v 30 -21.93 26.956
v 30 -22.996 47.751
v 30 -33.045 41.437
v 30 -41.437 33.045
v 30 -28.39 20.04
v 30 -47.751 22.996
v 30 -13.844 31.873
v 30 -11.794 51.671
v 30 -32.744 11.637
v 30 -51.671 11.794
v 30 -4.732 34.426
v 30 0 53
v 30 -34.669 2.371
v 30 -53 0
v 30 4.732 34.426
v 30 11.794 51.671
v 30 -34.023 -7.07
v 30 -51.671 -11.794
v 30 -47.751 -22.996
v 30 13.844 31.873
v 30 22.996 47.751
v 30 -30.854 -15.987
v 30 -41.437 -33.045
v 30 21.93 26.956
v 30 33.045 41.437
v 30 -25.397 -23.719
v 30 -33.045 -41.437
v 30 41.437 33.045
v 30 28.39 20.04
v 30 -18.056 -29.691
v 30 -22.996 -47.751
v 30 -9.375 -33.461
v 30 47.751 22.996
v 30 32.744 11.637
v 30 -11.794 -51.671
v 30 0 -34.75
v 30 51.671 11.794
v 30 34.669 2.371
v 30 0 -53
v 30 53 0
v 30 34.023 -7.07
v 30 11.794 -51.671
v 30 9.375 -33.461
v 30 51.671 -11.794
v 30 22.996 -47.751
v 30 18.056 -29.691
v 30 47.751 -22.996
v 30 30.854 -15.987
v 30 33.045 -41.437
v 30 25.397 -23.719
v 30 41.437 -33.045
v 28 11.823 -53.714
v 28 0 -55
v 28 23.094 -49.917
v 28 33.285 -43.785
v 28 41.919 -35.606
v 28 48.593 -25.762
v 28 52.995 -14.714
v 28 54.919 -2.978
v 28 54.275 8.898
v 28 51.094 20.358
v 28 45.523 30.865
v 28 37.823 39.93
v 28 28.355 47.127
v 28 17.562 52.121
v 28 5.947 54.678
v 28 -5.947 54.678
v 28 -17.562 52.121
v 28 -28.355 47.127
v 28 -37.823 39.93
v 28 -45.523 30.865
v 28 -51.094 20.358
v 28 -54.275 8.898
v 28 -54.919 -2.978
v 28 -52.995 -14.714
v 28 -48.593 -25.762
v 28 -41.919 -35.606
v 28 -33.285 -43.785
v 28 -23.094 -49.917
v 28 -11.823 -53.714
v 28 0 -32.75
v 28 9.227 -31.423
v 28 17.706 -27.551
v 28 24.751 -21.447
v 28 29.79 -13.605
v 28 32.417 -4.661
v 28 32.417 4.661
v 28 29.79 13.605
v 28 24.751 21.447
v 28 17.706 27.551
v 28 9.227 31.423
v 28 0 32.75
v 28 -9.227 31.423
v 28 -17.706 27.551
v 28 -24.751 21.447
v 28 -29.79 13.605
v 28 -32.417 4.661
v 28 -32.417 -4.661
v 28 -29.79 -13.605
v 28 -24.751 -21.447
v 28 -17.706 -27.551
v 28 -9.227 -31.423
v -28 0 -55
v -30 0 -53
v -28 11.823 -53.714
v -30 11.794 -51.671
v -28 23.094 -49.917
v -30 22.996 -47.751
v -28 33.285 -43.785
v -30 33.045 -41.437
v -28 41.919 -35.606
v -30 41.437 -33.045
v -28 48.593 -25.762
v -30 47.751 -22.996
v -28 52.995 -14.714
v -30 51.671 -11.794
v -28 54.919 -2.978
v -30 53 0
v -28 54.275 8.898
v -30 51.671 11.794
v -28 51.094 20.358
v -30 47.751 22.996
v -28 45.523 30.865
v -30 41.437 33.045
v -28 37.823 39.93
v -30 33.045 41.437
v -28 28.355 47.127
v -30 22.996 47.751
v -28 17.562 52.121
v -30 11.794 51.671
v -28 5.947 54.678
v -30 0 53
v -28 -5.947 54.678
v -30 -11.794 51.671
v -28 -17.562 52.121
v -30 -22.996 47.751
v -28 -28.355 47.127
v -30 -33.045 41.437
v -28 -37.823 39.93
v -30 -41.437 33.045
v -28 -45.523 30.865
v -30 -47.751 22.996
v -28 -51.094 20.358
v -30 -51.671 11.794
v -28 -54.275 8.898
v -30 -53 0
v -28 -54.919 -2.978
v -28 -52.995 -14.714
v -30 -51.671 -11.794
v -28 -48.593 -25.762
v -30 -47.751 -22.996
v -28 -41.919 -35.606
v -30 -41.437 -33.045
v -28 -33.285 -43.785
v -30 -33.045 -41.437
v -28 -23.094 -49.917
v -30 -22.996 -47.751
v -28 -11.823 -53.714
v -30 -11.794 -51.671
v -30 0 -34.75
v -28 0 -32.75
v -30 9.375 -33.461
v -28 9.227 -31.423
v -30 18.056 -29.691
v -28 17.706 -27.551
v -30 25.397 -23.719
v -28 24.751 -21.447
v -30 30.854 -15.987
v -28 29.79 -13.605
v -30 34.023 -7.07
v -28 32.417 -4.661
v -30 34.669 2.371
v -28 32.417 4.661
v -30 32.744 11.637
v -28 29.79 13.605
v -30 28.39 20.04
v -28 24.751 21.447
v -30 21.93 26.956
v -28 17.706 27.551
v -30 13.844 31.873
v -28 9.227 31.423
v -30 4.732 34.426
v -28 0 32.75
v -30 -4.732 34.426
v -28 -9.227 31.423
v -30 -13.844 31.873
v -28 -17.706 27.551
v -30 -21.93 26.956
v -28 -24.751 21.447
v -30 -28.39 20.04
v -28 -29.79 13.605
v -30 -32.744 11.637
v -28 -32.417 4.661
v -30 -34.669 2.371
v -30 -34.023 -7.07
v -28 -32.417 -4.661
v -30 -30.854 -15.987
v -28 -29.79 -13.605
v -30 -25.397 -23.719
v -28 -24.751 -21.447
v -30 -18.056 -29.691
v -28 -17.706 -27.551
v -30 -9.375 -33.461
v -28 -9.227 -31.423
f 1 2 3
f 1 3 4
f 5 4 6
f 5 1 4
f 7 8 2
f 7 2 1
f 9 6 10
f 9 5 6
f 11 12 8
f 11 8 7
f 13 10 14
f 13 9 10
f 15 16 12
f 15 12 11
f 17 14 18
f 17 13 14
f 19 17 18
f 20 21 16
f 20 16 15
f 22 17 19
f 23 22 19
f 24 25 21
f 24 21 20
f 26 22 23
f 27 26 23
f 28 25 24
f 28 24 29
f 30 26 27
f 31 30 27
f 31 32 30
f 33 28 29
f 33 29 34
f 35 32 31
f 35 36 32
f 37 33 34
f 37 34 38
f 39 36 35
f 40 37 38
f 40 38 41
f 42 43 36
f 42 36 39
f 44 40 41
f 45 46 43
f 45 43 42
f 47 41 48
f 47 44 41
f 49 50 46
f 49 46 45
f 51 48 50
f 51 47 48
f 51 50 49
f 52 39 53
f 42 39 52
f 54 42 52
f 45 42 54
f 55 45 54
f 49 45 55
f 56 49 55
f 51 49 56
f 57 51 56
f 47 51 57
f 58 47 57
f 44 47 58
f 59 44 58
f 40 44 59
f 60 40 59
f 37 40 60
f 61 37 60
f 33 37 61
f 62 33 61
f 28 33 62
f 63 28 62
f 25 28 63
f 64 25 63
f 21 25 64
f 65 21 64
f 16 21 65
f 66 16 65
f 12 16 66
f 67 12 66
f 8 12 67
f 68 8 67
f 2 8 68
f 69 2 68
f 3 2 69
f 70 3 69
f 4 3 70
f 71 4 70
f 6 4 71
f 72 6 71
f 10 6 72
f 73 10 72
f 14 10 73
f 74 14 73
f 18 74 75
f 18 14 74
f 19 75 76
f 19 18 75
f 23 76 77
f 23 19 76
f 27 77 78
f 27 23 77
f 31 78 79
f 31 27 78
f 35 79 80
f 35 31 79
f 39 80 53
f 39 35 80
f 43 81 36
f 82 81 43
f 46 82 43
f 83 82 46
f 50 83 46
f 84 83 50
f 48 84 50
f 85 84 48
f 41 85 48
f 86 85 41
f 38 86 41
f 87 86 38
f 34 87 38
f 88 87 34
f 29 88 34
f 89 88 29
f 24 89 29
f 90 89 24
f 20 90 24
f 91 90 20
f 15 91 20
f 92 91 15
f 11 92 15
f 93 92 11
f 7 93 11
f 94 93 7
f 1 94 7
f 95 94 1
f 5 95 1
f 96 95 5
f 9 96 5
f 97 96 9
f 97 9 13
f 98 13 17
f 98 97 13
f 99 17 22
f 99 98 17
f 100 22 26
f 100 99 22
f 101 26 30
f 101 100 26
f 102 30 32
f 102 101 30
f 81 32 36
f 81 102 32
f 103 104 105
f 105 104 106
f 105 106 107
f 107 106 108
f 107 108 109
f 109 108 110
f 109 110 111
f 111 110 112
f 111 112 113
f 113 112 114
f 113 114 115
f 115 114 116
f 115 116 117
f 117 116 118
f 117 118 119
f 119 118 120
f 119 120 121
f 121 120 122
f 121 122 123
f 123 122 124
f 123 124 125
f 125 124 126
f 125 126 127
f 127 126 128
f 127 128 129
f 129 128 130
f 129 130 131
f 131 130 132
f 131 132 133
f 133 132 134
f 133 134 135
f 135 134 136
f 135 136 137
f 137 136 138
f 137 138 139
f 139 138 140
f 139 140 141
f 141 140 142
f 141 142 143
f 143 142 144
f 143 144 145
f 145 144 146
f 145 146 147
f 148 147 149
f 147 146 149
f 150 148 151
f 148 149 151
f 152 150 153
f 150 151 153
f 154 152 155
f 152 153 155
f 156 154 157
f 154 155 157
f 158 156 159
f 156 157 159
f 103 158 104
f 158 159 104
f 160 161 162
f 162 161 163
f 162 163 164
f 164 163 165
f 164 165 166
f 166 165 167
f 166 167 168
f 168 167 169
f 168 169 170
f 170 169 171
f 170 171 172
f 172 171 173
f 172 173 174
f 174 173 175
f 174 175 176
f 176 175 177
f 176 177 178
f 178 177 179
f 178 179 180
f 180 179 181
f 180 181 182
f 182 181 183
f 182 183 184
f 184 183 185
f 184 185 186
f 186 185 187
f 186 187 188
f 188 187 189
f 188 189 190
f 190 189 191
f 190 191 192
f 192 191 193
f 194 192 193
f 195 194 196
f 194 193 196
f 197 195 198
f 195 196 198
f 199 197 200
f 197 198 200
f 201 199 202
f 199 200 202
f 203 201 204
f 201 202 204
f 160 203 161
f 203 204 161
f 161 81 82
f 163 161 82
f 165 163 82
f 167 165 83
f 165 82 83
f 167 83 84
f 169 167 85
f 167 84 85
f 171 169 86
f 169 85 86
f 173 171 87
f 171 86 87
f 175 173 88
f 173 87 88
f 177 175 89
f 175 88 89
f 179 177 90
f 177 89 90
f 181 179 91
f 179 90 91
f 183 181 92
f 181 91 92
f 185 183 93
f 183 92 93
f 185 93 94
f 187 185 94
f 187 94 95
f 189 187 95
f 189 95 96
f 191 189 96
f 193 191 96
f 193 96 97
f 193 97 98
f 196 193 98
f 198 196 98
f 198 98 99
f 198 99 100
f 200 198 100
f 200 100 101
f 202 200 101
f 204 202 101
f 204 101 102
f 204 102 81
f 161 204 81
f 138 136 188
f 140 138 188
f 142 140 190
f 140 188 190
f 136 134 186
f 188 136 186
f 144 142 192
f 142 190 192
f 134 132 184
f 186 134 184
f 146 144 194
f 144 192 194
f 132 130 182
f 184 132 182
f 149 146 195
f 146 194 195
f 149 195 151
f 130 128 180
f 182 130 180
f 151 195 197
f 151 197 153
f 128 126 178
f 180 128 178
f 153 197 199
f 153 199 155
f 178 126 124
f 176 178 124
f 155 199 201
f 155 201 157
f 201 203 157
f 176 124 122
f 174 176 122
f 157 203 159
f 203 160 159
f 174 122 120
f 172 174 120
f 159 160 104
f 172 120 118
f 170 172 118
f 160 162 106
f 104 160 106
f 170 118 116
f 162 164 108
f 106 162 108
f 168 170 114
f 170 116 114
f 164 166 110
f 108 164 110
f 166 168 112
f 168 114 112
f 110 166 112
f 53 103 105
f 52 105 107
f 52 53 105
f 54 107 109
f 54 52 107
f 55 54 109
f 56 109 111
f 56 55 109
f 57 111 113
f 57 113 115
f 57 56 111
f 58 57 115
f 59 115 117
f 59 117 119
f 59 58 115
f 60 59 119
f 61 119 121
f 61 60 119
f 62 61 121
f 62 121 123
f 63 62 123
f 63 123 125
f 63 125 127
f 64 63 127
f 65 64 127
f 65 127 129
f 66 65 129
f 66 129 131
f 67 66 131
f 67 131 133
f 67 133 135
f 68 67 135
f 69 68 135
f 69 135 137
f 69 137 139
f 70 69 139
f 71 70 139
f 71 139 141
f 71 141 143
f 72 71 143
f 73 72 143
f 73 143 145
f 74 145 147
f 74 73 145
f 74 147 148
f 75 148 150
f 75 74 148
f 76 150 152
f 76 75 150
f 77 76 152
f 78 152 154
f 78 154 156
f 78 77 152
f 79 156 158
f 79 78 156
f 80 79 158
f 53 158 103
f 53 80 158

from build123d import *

# Parameters (mm, degrees)
SKETCH1_R          = 55
SKETCH1_R_2        = 30
EXTRUDE1_DEPTH     = 30
SKETCH2_R          = 32.75
MACHINE_DEPTH      = 30
CHAMFER_OUTER_SIZE = 2
CHAMFER_INNER_SIZE = 2


with BuildPart() as part:
    # Sketch1 → Extrude1 (new body, symmetric)
    with BuildSketch(Plane(origin=(0, 0, 0), x_dir=(0, 0, -1), z_dir=(1, 0, 0))):
        Circle(SKETCH1_R)
        Circle(SKETCH1_R_2, mode=Mode.SUBTRACT)
    extrude(amount=EXTRUDE1_DEPTH, both=True)

    # Sketch2 → Machine (cut, symmetric)
    with BuildSketch(Plane(origin=(0, 0, 0), x_dir=(0, 0, -1), z_dir=(1, 0, 0))):
        Circle(SKETCH2_R)
    extrude(amount=MACHINE_DEPTH, both=True, mode=Mode.SUBTRACT)

    # Chamfer-Outer
    chamfer_outer_edges = [part.edges().sort_by_distance(p)[0] for p in [
        (30, 0, 55),
        (-30, 0, 55),
    ]]
    chamfer(chamfer_outer_edges, length=CHAMFER_OUTER_SIZE)

    # Chamfer-Inner
    chamfer_inner_edges = [part.edges().sort_by_distance(p)[0] for p in [
        (30, 0, 32.75),
        (-30, 0, 32.75),
    ]]
    chamfer(chamfer_inner_edges, length=CHAMFER_INNER_SIZE)


solid = part.part
